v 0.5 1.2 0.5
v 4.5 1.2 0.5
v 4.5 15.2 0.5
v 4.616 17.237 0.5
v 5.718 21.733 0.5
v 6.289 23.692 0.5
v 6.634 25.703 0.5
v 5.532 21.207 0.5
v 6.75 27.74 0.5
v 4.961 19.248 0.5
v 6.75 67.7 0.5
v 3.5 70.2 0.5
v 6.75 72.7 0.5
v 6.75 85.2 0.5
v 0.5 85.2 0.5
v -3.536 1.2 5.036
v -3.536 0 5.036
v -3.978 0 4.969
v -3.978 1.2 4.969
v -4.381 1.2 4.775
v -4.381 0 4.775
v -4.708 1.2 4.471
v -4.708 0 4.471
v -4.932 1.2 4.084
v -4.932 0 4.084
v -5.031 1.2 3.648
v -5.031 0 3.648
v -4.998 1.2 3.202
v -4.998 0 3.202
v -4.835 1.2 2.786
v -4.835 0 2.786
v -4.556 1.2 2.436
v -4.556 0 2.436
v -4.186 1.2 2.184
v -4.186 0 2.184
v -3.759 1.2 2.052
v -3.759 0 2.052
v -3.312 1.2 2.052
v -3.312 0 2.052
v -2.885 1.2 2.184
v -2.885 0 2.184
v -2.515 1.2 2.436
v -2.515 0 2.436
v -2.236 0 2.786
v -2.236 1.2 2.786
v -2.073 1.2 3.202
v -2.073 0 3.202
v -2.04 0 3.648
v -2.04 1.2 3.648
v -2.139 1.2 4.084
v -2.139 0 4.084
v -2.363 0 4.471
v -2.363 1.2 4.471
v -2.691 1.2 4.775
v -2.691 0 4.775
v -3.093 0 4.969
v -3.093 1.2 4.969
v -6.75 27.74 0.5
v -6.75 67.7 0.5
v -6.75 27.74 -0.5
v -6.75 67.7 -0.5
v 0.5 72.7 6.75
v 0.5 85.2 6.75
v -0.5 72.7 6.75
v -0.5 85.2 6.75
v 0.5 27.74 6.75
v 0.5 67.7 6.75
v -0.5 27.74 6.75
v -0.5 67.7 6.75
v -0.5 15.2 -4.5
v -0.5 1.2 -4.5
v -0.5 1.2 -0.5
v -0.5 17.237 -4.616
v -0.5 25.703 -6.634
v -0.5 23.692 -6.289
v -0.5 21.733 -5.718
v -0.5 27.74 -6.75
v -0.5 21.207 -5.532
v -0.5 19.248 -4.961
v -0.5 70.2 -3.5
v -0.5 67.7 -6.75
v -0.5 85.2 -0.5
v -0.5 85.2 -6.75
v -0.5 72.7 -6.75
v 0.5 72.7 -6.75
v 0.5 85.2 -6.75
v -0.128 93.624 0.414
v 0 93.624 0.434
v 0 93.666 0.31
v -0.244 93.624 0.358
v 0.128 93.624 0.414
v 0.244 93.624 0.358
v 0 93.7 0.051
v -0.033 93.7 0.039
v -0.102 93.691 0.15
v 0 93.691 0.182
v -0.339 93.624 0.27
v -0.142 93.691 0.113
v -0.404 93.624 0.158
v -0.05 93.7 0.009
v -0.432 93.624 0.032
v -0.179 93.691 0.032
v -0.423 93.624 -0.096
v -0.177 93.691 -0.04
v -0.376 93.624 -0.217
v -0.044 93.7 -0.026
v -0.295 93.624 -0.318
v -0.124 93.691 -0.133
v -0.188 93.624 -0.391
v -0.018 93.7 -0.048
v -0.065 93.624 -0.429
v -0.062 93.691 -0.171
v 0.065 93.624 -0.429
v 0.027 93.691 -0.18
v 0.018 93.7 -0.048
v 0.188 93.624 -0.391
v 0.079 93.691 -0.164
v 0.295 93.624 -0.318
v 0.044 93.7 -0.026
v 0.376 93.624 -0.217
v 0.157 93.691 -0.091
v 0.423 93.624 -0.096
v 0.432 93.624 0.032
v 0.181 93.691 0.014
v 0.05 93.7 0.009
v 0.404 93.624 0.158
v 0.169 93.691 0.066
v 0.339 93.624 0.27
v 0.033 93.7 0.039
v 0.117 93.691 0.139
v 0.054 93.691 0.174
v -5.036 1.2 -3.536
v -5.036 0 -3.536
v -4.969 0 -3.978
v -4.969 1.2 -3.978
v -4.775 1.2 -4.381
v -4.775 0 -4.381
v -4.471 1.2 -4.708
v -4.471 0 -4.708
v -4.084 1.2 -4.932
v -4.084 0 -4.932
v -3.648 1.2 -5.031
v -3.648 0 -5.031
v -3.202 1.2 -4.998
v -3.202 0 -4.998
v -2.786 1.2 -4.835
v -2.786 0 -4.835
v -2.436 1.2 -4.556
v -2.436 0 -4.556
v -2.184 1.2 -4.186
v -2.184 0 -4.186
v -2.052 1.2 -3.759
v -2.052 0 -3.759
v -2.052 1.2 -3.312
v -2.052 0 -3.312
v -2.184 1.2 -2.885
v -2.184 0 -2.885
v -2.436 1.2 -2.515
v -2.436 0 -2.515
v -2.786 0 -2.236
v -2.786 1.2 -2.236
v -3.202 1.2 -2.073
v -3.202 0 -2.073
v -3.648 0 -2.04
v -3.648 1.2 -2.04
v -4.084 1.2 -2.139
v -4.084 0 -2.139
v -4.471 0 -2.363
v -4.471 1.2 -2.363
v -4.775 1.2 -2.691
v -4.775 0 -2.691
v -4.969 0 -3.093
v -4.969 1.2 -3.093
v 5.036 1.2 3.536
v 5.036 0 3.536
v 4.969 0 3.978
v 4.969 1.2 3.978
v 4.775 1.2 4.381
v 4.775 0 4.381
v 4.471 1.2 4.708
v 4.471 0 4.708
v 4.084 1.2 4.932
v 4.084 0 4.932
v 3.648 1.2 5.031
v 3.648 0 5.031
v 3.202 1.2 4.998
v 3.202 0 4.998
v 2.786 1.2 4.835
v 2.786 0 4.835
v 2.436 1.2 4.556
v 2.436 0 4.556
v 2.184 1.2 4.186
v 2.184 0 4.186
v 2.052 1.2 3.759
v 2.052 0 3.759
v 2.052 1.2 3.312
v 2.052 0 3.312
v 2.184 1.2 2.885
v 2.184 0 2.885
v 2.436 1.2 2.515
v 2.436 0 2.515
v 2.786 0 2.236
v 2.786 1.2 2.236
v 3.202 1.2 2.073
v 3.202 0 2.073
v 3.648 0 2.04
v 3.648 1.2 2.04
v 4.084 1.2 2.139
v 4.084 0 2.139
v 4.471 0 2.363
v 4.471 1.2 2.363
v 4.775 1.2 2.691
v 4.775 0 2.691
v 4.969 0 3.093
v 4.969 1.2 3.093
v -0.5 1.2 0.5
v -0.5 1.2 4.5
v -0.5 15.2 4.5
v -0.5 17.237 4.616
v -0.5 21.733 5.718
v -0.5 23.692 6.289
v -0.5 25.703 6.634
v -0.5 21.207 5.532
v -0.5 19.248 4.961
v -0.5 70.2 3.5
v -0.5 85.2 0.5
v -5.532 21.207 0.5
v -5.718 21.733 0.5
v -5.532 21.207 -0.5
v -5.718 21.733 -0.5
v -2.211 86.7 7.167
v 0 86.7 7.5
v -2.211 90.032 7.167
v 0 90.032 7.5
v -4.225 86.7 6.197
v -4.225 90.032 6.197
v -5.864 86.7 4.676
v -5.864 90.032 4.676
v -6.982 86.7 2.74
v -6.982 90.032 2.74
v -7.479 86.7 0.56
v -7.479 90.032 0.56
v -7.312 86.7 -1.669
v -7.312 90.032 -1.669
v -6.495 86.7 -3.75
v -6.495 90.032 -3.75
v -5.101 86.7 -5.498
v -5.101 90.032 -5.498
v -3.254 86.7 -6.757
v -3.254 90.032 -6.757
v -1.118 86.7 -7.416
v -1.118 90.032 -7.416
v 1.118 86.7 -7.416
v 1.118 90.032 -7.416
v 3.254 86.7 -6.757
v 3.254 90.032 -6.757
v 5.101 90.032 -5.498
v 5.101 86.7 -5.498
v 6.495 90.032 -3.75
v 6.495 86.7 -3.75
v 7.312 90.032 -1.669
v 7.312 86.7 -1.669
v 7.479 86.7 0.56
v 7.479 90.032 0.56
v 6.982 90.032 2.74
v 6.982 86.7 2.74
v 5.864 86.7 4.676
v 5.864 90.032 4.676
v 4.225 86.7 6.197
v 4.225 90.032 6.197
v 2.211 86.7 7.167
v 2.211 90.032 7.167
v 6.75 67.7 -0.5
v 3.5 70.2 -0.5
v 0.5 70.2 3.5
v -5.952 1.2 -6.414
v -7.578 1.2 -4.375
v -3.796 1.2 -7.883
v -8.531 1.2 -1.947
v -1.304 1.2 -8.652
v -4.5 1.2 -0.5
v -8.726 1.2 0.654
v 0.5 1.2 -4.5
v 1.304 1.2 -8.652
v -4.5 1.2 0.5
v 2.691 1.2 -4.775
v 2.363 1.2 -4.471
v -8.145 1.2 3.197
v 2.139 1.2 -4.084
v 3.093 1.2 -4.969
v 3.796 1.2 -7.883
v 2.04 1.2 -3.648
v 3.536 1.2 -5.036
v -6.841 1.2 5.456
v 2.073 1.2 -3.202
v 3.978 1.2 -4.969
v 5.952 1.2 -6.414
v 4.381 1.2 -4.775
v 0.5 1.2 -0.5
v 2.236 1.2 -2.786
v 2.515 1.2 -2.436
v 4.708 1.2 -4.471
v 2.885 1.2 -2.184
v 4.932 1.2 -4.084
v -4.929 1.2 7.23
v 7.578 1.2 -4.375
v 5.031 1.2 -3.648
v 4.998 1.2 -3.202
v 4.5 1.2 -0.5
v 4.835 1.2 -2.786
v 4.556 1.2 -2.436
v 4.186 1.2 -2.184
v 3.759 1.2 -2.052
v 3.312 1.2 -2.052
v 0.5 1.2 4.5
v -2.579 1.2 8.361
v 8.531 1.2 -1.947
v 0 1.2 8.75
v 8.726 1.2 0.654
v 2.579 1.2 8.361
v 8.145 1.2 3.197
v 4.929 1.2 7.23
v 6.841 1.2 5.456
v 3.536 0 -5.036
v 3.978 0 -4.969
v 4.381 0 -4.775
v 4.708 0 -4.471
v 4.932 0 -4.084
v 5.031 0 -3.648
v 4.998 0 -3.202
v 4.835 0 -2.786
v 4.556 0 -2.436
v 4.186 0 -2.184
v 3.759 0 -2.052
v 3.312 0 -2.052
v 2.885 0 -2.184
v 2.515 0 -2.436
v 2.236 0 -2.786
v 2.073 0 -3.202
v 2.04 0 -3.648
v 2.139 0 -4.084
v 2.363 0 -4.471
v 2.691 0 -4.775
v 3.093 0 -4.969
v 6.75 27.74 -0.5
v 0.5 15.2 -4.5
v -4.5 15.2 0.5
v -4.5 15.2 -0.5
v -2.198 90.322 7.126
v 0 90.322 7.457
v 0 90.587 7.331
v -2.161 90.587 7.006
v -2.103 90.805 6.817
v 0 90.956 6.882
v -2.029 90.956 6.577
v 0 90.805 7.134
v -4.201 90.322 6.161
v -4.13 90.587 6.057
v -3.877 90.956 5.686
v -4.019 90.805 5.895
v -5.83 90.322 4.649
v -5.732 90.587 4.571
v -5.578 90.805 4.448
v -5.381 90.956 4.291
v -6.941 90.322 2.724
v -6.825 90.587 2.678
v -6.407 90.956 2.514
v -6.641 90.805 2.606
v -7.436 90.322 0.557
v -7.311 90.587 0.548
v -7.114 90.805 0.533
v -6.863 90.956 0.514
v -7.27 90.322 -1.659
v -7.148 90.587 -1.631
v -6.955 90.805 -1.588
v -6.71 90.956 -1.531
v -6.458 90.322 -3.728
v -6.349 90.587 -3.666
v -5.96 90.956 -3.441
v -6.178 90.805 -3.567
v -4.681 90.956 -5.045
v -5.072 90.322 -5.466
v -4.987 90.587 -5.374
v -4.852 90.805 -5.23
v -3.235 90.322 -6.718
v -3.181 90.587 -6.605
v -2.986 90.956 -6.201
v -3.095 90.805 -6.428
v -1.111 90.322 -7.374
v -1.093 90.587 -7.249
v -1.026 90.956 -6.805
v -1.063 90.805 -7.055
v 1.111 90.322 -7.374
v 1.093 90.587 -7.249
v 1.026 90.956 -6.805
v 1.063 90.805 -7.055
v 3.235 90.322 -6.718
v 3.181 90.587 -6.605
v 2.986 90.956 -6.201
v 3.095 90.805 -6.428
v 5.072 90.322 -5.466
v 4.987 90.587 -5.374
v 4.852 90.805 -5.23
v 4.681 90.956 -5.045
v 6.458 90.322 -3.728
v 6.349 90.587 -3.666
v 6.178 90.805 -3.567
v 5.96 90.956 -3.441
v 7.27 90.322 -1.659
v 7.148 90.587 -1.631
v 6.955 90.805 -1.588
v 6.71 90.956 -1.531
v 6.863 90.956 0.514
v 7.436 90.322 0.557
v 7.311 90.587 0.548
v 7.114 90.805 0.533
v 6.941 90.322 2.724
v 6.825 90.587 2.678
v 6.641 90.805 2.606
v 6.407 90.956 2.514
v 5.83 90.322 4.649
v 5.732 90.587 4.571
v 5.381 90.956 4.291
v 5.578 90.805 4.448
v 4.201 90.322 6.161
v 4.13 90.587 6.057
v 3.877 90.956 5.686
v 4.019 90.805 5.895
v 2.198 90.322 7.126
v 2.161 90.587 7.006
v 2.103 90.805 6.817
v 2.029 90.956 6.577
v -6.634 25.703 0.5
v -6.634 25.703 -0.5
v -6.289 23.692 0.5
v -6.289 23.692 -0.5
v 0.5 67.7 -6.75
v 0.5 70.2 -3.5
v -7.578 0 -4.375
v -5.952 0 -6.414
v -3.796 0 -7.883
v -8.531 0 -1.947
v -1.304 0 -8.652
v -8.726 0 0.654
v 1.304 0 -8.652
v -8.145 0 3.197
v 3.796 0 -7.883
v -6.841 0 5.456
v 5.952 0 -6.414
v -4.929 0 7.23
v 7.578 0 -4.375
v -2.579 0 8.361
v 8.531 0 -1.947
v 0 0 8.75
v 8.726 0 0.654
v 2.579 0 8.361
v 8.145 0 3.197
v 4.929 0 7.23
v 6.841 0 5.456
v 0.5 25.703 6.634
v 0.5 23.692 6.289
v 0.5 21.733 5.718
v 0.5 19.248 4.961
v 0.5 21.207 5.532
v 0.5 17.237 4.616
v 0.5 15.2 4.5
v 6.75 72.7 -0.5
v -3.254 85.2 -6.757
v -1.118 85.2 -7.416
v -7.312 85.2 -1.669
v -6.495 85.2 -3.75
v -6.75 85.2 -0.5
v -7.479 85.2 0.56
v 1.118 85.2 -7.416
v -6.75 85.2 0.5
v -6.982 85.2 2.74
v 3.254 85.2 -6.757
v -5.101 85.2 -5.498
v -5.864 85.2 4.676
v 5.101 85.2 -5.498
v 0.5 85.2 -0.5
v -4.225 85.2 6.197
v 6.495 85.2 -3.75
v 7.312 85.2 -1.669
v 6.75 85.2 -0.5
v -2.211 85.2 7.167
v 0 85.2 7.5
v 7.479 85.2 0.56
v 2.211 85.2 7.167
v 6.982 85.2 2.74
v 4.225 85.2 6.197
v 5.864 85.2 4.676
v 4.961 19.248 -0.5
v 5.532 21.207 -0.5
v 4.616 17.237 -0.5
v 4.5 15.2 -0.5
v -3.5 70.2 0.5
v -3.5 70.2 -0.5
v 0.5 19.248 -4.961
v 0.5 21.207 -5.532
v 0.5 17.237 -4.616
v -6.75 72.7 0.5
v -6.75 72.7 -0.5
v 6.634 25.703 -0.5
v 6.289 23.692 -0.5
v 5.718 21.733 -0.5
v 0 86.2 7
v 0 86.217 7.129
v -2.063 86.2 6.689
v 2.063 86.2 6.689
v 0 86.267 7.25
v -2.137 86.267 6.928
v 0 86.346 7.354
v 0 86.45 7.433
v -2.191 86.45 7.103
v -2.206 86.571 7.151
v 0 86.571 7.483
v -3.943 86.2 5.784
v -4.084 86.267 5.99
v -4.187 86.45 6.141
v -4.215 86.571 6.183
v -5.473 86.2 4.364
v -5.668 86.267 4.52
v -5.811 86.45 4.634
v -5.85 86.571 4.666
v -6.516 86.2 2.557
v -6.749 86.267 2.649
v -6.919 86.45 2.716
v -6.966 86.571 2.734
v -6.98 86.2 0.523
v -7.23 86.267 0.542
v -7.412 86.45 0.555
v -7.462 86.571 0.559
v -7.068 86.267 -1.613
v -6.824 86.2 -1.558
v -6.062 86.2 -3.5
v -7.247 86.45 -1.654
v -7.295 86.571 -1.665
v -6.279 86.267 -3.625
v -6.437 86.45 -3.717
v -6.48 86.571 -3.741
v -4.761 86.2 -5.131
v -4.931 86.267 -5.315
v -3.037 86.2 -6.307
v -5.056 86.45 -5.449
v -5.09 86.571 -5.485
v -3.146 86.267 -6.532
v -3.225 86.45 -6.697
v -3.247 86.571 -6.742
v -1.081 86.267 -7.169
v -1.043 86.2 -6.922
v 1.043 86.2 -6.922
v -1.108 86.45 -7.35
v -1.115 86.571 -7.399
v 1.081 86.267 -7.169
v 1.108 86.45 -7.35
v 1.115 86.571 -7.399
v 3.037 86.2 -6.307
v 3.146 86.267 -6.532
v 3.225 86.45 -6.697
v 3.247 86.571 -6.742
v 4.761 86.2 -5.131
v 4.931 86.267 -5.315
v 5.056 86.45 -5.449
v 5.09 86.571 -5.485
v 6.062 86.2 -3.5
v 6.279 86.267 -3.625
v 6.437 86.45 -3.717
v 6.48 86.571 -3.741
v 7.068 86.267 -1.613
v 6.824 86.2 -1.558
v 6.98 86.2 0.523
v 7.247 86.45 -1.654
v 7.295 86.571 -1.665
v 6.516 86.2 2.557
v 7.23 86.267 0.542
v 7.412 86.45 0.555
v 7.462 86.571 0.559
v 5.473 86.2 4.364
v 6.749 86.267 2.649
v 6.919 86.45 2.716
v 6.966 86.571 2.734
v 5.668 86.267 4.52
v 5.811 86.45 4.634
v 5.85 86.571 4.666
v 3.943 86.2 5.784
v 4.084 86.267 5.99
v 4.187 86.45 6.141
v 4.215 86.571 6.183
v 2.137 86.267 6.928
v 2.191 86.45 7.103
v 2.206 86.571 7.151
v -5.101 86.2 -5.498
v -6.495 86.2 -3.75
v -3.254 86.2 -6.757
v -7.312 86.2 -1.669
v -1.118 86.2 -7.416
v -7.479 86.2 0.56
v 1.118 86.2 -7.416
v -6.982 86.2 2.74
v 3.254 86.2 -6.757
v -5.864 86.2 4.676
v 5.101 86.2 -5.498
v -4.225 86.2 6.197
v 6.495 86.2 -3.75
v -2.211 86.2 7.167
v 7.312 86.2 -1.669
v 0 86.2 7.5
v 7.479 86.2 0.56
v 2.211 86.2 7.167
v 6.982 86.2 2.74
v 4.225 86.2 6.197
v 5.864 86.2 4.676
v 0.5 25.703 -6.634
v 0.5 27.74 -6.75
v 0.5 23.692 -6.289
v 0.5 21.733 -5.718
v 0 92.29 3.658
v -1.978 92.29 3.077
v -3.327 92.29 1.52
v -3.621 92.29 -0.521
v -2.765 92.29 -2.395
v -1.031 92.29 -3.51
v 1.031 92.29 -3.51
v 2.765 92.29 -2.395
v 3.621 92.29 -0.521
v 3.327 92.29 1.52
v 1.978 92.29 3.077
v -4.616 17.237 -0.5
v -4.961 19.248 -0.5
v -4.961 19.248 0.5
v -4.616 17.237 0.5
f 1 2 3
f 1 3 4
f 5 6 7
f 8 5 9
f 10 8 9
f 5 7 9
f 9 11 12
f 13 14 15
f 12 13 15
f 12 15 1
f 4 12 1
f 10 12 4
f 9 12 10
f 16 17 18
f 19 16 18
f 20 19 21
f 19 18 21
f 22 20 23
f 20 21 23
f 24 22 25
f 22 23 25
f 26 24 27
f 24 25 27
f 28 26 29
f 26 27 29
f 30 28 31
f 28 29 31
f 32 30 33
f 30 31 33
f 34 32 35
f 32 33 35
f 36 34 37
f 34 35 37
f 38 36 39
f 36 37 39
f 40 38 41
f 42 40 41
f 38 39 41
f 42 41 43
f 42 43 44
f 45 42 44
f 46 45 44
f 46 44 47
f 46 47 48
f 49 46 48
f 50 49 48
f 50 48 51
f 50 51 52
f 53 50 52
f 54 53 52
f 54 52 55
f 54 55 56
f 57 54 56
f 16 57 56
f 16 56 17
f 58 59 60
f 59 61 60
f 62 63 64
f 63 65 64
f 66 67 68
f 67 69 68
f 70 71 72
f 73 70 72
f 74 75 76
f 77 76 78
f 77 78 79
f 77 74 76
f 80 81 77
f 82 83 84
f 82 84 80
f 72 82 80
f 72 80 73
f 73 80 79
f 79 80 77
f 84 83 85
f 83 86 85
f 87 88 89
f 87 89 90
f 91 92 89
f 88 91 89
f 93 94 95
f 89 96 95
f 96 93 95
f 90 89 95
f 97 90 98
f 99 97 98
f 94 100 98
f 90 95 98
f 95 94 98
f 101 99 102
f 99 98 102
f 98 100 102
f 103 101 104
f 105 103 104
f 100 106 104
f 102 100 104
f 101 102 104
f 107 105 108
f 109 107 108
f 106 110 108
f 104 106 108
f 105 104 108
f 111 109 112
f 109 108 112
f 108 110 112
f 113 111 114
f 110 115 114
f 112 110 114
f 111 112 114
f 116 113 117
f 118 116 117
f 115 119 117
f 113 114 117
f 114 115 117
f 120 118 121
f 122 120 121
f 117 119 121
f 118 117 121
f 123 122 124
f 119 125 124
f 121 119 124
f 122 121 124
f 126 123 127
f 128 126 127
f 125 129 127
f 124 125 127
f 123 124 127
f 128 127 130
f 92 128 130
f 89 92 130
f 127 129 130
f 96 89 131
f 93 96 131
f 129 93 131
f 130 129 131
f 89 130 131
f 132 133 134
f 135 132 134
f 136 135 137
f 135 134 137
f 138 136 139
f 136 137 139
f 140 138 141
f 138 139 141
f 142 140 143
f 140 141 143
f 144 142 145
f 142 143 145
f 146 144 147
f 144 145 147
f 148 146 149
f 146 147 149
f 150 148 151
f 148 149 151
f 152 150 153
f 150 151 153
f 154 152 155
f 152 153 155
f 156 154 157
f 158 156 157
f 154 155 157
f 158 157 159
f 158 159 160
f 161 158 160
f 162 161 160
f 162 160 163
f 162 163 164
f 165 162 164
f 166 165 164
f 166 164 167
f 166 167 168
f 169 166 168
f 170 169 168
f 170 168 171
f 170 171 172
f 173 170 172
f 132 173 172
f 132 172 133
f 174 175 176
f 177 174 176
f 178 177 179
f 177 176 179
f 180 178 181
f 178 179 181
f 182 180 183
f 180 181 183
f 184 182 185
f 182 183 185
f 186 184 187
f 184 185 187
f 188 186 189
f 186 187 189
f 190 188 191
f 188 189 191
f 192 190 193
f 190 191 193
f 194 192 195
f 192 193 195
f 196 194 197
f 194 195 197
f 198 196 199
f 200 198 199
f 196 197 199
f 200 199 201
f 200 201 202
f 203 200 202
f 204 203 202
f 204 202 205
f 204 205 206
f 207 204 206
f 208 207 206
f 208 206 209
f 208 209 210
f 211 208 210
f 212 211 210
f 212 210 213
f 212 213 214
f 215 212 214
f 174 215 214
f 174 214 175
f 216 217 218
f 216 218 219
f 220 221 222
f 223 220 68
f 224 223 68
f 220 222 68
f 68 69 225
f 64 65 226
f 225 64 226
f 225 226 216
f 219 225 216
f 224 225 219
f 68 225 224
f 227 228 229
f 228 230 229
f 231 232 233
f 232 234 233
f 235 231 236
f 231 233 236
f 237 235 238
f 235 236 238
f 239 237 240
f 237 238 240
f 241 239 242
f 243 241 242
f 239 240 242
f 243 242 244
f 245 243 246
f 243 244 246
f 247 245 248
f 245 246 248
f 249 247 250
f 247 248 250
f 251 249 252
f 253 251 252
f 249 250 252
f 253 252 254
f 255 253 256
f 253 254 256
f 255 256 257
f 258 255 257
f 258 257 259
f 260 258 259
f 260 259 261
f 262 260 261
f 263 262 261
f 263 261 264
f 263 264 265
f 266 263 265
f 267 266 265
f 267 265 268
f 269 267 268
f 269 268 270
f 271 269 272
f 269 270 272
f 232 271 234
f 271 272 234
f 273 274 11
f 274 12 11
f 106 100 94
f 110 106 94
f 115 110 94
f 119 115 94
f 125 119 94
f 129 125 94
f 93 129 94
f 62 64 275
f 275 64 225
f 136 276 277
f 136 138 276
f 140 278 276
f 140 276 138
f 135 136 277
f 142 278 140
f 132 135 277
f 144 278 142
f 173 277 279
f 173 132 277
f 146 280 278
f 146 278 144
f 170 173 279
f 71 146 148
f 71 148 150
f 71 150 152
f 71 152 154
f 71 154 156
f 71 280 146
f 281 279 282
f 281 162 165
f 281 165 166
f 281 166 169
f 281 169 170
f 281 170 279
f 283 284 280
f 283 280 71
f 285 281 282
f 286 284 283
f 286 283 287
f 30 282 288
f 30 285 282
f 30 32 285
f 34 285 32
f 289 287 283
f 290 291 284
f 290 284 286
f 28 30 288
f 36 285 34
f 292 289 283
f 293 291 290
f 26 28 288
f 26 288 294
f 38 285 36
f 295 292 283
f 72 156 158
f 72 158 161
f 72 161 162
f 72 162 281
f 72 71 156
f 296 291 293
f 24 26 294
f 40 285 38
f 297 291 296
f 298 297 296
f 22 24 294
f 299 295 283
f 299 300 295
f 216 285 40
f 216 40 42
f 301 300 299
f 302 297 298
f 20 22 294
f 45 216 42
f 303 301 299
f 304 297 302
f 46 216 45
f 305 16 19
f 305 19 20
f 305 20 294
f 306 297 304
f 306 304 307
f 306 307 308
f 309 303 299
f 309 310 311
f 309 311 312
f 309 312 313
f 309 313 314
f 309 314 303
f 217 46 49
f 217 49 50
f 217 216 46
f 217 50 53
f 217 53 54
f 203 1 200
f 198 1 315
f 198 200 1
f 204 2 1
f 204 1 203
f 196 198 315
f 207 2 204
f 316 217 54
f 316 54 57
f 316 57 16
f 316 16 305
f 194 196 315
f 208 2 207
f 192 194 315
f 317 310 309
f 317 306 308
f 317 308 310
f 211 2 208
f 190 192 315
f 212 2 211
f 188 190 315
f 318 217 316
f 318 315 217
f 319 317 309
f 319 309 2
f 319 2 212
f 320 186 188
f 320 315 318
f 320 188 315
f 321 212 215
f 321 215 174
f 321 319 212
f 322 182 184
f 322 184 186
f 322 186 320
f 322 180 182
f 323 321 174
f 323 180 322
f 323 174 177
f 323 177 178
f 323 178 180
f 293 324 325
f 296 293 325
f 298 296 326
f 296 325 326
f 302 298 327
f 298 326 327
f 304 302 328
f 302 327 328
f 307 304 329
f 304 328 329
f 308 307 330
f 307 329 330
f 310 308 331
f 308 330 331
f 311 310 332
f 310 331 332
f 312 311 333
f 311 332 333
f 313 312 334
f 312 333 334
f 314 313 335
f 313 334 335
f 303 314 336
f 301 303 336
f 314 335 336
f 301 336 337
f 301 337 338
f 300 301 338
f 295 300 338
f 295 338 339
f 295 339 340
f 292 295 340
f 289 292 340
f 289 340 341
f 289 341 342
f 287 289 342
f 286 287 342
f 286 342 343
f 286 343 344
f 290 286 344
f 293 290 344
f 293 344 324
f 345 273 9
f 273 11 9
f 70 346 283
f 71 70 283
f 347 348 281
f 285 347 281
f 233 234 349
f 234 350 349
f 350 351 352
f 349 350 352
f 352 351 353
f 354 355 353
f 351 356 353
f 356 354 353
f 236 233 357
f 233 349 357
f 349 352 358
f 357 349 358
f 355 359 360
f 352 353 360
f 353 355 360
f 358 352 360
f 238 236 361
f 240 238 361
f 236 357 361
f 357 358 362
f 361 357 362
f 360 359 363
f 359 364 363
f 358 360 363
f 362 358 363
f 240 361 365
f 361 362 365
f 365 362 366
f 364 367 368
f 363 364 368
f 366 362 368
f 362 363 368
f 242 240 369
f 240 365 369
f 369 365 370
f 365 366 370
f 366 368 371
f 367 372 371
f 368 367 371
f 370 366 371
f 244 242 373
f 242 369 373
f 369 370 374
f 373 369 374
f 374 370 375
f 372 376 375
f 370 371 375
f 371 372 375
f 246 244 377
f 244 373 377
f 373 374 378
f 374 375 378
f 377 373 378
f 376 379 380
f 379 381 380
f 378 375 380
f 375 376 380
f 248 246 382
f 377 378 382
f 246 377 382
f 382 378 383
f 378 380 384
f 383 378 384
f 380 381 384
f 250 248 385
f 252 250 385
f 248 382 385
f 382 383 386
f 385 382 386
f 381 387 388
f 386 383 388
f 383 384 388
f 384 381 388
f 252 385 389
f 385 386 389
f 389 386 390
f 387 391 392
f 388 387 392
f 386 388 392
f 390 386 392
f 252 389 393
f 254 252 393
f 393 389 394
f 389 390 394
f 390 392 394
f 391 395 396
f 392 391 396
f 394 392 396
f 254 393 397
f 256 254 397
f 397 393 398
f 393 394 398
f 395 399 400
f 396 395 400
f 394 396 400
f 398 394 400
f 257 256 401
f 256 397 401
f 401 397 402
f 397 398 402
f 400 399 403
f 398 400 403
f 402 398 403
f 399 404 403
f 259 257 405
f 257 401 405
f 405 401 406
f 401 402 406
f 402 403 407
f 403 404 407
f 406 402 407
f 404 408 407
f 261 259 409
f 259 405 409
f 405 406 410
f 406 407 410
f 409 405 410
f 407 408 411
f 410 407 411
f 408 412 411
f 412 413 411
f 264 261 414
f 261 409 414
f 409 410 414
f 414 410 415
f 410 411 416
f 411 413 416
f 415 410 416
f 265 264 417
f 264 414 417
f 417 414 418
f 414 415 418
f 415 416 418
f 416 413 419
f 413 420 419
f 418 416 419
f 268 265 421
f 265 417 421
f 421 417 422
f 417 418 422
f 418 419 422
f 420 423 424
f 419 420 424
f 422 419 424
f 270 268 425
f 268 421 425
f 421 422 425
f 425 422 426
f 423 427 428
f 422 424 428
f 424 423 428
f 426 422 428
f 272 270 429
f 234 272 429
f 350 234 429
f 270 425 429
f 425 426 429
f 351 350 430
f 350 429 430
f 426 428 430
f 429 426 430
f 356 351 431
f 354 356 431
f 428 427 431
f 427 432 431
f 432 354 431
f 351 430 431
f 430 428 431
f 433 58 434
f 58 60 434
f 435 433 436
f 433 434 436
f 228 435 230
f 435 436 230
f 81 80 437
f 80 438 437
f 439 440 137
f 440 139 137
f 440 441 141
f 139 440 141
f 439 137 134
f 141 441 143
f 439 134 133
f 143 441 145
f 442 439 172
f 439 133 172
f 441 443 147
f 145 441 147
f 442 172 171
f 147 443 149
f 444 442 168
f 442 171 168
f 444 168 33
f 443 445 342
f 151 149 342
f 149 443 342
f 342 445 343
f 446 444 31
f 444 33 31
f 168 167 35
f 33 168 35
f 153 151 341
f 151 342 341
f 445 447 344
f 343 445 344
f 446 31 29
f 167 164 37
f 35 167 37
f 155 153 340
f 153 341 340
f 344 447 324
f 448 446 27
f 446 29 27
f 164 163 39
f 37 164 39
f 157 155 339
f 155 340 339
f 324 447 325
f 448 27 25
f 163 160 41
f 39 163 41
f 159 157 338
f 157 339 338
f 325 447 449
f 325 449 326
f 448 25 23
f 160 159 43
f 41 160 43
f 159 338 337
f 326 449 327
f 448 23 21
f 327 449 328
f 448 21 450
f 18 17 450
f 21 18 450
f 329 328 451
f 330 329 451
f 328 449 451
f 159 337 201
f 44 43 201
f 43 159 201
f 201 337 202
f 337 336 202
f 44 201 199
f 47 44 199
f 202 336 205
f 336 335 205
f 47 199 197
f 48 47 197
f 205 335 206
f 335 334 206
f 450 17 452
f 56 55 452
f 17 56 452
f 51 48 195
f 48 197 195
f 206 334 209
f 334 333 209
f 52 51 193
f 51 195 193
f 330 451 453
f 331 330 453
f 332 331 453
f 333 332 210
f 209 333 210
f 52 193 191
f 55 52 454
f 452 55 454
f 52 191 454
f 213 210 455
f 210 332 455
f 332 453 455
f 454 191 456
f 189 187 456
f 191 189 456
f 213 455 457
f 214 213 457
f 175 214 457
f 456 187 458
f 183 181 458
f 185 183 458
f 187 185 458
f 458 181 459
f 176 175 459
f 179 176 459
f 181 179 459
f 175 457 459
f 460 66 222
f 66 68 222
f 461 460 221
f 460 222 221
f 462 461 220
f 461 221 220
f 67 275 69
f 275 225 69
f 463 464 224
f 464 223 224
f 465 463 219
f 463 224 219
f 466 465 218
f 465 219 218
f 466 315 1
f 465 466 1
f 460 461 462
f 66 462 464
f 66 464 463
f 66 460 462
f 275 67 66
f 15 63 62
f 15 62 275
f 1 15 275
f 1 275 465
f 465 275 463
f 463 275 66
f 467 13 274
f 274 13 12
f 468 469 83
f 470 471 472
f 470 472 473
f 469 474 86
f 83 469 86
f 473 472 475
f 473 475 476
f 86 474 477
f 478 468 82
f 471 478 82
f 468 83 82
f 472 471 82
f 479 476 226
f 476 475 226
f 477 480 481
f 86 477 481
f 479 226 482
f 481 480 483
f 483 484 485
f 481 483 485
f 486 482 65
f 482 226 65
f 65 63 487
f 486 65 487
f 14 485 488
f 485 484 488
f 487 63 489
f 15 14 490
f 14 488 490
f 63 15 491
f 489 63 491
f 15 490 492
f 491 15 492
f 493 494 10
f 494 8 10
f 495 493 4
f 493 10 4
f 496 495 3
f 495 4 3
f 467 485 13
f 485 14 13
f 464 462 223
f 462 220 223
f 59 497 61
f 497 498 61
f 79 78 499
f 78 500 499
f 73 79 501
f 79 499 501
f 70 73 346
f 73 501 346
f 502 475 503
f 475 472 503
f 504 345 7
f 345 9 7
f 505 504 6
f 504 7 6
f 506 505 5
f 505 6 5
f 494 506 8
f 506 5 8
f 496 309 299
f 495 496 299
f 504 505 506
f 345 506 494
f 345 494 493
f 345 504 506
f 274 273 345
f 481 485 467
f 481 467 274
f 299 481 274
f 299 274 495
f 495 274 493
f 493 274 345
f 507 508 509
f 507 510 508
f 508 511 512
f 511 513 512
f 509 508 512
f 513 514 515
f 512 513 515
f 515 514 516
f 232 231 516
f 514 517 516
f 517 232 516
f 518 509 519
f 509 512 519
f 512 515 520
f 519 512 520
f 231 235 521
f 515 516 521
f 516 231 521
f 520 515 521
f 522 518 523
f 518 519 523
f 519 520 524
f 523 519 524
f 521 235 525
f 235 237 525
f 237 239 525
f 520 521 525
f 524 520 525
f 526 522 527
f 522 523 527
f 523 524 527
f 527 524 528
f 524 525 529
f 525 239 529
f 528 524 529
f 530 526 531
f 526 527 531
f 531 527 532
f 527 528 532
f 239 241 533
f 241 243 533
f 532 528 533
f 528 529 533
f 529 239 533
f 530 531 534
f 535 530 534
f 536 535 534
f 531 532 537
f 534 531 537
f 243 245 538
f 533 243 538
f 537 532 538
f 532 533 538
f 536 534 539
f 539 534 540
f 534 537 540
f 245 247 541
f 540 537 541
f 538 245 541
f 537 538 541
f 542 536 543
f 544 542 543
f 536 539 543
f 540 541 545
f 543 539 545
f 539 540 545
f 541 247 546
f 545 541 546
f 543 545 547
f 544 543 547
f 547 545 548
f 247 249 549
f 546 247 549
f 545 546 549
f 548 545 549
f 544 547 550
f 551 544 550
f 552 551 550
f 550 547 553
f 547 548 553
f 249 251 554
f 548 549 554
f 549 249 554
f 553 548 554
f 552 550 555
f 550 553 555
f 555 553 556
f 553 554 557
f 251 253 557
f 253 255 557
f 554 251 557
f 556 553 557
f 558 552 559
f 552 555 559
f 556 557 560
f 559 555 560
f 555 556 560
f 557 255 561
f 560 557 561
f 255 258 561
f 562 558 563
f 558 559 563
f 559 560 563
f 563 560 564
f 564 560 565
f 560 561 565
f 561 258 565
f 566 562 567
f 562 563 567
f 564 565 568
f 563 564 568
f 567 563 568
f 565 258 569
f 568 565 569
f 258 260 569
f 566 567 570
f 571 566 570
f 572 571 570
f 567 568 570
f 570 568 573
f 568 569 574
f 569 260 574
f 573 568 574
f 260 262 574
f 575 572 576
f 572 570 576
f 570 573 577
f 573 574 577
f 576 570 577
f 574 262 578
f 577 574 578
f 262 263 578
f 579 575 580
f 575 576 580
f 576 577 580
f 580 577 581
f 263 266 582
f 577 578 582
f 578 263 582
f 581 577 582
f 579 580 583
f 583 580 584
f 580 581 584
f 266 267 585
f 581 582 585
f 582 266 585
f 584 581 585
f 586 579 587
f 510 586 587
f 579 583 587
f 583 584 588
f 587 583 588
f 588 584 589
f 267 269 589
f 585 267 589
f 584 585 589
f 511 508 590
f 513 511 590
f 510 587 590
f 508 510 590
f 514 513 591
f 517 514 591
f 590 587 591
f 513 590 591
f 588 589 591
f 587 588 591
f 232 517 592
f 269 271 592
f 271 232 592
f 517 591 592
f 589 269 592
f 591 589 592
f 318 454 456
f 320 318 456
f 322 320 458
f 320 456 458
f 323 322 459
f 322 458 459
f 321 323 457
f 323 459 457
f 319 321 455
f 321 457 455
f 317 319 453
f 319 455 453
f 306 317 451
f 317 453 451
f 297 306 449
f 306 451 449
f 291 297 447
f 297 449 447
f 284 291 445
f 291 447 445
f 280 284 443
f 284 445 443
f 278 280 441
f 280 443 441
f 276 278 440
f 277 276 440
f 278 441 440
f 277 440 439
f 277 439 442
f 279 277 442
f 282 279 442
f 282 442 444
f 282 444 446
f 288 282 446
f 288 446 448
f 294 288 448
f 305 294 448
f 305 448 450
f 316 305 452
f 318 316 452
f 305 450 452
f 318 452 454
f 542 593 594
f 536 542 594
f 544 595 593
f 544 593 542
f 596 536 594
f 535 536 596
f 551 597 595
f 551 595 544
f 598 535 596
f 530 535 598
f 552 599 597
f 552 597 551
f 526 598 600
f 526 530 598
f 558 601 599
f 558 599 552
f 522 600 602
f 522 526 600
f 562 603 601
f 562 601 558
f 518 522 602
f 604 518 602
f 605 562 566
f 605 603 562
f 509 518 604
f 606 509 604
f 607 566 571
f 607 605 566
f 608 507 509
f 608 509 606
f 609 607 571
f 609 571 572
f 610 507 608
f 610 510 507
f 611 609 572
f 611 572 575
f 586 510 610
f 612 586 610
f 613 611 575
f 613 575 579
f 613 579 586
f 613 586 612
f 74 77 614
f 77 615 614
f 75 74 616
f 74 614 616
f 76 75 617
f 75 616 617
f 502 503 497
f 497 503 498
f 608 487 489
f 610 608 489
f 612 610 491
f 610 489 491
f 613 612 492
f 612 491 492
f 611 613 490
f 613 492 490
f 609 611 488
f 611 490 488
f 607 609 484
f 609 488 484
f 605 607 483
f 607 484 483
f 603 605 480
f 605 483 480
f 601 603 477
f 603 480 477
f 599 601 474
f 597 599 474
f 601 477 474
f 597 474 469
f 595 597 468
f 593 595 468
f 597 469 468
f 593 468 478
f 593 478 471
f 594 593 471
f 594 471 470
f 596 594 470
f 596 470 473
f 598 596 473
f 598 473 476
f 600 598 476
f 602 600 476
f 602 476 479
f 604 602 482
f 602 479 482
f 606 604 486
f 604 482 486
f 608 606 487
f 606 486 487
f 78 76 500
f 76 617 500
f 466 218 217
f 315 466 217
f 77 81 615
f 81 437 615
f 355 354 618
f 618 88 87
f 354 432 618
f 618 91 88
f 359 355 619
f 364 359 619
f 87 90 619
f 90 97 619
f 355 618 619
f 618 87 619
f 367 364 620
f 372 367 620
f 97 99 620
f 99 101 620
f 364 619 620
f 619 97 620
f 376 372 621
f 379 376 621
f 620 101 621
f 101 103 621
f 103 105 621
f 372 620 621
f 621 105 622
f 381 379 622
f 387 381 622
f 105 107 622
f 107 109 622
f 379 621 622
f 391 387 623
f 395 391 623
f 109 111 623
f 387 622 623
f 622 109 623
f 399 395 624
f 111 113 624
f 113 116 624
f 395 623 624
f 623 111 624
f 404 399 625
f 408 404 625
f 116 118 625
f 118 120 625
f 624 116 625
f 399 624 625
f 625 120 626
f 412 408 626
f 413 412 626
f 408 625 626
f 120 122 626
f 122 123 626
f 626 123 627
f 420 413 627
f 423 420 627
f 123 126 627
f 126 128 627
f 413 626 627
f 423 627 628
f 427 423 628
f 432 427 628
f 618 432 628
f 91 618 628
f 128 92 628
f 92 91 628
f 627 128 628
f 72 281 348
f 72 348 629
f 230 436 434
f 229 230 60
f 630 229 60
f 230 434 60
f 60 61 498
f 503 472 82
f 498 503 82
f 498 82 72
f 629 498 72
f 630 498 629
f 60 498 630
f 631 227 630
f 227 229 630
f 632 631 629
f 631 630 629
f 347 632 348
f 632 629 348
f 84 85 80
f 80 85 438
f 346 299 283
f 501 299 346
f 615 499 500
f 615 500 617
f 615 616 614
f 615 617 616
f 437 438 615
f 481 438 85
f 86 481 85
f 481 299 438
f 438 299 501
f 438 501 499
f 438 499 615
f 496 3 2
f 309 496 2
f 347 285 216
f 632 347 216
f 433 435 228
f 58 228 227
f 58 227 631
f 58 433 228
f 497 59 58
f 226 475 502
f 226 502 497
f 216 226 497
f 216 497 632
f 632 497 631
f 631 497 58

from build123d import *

# Parameters (mm, degrees)
SKETCH1_R           = 8.75
BOSS_EXTRUDE1_DEPTH = 1.2
BOSS_EXTRUDE2_DEPTH = 0.5
CIRPATTERN1_COUNT   = 4
SKETCH4_R           = 7.5
BOSS_EXTRUDE3_DEPTH = 1
CUT_EXTRUDE1_REACH  = 96.514
SKETCH6_R           = 1.5
CIRPATTERN2_COUNT   = 4


with BuildPart() as part:
    # Sketch1 → Boss-Extrude1 (new body)
    with BuildSketch(Plane(origin=(0, 0, 0), x_dir=(1, 0, 0), z_dir=(0, 1, 0))):
        with Locations(Location((0, 0, 0), (0, 0, 270))):
            Circle(SKETCH1_R)
    extrude(amount=BOSS_EXTRUDE1_DEPTH)

    # Sketch3 → Boss-Extrude2 (add, symmetric)
    with BuildSketch(Plane(origin=(0, 0, 0), x_dir=(0, 0, -1), z_dir=(1, 0, 0))):
        with BuildLine():
            Line((0, 1.2), (0, 85.2))
            Line((0, 85.2), (6.75, 85.2))
            Line((6.75, 85.2), (6.75, 72.7))
            Line((6.75, 72.7), (3.5, 70.2))
            Line((3.5, 70.2), (6.75, 67.7))
            Line((6.75, 67.7), (6.75, 27.739908728))
            ThreePointArc((6.75, 27.739908728), (6.490167531, 24.69254003), (5.718171558, 21.733149703))
            Line((5.718171558, 21.733149703), (5.531828442, 21.206759025))
            ThreePointArc((5.531828442, 21.206759025), (4.759832469, 18.247368698), (4.5, 15.2))
            Line((4.5, 15.2), (4.5, 1.2))
            Line((4.5, 1.2), (0, 1.2))
        make_face()
    boss_extrude2 = extrude(amount=BOSS_EXTRUDE2_DEPTH, both=True)

    # CirPattern1: Boss-Extrude2 ×4 about axis
    cirpattern1_axis = Axis((0, 0, 0), (0, 1, 0))
    for i in range(1, CIRPATTERN1_COUNT):
        add(boss_extrude2.rotate(cirpattern1_axis, i * 360 / CIRPATTERN1_COUNT))

    # Sketch4 → Boss-Extrude3 (add)
    with BuildSketch(Plane(origin=(0, 85.2, 0), x_dir=(1, 0, 0), z_dir=(0, 1, 0))):
        with Locations(Location((0, 0, 0), (0, 0, 270))):
            Circle(SKETCH4_R)
    extrude(amount=BOSS_EXTRUDE3_DEPTH)

    # Sketch5 → Revolve1 (revolve)
    with BuildSketch(Plane(origin=(0, 0, 0), x_dir=(0, 0, -1), z_dir=(1, 0, 0)), mode=Mode.PRIVATE) as revolve1_sk:
        with BuildLine():
            Line((0, 86.2), (7, 86.2))
            ThreePointArc((7, 86.2), (7.353553391, 86.346446609), (7.5, 86.7))
            Line((7.5, 86.7), (7.5, 90.031561736))
            ThreePointArc((7.5, 90.031561736), (7.331369891, 90.587281183), (6.882351793, 90.955578569))
            Line((6.882351793, 90.955578569), (0.433625988, 93.624016832))
            ThreePointArc((0.433625988, 93.624016832), (0.246188494, 93.680820277), (0.051274196, 93.7))
            Line((0.051274196, 93.7), (0, 93.7))
            Line((0, 93.7), (0, 86.2))
        make_face()
    revolve(revolve1_sk.sketch.rotate(Axis((0, 93.7, 0), (0, -1, 0)), 180), axis=Axis((0, 93.7, 0), (0, -1, 0)))

    # Sketch6 → Cut-Extrude1 (cut, up to next)
    with BuildSketch(Plane.XZ, mode=Mode.PRIVATE) as cut_extrude1_sk1:
        with Locations(Location((3.535533906, -3.535533906, 0), (0, 0, 270))):
            Circle(SKETCH6_R)
    cut_extrude1_tool1 = extrude(cut_extrude1_sk1.sketch, amount=-CUT_EXTRUDE1_REACH, mode=Mode.PRIVATE) & part.part
    cut_extrude1 = cut_extrude1_tool1.solids().sort_by_distance((3.535534, 0, -3.535534))[0]
    add(cut_extrude1, mode=Mode.SUBTRACT)

    # CirPattern2: Cut-Extrude1 ×4 about axis
    cirpattern2_axis = Axis((0, 0, 0), (0, 1, 0))
    for i in range(1, CIRPATTERN2_COUNT):
        add(cut_extrude1.rotate(cirpattern2_axis, i * 360 / CIRPATTERN2_COUNT), mode=Mode.SUBTRACT)


solid = part.part
